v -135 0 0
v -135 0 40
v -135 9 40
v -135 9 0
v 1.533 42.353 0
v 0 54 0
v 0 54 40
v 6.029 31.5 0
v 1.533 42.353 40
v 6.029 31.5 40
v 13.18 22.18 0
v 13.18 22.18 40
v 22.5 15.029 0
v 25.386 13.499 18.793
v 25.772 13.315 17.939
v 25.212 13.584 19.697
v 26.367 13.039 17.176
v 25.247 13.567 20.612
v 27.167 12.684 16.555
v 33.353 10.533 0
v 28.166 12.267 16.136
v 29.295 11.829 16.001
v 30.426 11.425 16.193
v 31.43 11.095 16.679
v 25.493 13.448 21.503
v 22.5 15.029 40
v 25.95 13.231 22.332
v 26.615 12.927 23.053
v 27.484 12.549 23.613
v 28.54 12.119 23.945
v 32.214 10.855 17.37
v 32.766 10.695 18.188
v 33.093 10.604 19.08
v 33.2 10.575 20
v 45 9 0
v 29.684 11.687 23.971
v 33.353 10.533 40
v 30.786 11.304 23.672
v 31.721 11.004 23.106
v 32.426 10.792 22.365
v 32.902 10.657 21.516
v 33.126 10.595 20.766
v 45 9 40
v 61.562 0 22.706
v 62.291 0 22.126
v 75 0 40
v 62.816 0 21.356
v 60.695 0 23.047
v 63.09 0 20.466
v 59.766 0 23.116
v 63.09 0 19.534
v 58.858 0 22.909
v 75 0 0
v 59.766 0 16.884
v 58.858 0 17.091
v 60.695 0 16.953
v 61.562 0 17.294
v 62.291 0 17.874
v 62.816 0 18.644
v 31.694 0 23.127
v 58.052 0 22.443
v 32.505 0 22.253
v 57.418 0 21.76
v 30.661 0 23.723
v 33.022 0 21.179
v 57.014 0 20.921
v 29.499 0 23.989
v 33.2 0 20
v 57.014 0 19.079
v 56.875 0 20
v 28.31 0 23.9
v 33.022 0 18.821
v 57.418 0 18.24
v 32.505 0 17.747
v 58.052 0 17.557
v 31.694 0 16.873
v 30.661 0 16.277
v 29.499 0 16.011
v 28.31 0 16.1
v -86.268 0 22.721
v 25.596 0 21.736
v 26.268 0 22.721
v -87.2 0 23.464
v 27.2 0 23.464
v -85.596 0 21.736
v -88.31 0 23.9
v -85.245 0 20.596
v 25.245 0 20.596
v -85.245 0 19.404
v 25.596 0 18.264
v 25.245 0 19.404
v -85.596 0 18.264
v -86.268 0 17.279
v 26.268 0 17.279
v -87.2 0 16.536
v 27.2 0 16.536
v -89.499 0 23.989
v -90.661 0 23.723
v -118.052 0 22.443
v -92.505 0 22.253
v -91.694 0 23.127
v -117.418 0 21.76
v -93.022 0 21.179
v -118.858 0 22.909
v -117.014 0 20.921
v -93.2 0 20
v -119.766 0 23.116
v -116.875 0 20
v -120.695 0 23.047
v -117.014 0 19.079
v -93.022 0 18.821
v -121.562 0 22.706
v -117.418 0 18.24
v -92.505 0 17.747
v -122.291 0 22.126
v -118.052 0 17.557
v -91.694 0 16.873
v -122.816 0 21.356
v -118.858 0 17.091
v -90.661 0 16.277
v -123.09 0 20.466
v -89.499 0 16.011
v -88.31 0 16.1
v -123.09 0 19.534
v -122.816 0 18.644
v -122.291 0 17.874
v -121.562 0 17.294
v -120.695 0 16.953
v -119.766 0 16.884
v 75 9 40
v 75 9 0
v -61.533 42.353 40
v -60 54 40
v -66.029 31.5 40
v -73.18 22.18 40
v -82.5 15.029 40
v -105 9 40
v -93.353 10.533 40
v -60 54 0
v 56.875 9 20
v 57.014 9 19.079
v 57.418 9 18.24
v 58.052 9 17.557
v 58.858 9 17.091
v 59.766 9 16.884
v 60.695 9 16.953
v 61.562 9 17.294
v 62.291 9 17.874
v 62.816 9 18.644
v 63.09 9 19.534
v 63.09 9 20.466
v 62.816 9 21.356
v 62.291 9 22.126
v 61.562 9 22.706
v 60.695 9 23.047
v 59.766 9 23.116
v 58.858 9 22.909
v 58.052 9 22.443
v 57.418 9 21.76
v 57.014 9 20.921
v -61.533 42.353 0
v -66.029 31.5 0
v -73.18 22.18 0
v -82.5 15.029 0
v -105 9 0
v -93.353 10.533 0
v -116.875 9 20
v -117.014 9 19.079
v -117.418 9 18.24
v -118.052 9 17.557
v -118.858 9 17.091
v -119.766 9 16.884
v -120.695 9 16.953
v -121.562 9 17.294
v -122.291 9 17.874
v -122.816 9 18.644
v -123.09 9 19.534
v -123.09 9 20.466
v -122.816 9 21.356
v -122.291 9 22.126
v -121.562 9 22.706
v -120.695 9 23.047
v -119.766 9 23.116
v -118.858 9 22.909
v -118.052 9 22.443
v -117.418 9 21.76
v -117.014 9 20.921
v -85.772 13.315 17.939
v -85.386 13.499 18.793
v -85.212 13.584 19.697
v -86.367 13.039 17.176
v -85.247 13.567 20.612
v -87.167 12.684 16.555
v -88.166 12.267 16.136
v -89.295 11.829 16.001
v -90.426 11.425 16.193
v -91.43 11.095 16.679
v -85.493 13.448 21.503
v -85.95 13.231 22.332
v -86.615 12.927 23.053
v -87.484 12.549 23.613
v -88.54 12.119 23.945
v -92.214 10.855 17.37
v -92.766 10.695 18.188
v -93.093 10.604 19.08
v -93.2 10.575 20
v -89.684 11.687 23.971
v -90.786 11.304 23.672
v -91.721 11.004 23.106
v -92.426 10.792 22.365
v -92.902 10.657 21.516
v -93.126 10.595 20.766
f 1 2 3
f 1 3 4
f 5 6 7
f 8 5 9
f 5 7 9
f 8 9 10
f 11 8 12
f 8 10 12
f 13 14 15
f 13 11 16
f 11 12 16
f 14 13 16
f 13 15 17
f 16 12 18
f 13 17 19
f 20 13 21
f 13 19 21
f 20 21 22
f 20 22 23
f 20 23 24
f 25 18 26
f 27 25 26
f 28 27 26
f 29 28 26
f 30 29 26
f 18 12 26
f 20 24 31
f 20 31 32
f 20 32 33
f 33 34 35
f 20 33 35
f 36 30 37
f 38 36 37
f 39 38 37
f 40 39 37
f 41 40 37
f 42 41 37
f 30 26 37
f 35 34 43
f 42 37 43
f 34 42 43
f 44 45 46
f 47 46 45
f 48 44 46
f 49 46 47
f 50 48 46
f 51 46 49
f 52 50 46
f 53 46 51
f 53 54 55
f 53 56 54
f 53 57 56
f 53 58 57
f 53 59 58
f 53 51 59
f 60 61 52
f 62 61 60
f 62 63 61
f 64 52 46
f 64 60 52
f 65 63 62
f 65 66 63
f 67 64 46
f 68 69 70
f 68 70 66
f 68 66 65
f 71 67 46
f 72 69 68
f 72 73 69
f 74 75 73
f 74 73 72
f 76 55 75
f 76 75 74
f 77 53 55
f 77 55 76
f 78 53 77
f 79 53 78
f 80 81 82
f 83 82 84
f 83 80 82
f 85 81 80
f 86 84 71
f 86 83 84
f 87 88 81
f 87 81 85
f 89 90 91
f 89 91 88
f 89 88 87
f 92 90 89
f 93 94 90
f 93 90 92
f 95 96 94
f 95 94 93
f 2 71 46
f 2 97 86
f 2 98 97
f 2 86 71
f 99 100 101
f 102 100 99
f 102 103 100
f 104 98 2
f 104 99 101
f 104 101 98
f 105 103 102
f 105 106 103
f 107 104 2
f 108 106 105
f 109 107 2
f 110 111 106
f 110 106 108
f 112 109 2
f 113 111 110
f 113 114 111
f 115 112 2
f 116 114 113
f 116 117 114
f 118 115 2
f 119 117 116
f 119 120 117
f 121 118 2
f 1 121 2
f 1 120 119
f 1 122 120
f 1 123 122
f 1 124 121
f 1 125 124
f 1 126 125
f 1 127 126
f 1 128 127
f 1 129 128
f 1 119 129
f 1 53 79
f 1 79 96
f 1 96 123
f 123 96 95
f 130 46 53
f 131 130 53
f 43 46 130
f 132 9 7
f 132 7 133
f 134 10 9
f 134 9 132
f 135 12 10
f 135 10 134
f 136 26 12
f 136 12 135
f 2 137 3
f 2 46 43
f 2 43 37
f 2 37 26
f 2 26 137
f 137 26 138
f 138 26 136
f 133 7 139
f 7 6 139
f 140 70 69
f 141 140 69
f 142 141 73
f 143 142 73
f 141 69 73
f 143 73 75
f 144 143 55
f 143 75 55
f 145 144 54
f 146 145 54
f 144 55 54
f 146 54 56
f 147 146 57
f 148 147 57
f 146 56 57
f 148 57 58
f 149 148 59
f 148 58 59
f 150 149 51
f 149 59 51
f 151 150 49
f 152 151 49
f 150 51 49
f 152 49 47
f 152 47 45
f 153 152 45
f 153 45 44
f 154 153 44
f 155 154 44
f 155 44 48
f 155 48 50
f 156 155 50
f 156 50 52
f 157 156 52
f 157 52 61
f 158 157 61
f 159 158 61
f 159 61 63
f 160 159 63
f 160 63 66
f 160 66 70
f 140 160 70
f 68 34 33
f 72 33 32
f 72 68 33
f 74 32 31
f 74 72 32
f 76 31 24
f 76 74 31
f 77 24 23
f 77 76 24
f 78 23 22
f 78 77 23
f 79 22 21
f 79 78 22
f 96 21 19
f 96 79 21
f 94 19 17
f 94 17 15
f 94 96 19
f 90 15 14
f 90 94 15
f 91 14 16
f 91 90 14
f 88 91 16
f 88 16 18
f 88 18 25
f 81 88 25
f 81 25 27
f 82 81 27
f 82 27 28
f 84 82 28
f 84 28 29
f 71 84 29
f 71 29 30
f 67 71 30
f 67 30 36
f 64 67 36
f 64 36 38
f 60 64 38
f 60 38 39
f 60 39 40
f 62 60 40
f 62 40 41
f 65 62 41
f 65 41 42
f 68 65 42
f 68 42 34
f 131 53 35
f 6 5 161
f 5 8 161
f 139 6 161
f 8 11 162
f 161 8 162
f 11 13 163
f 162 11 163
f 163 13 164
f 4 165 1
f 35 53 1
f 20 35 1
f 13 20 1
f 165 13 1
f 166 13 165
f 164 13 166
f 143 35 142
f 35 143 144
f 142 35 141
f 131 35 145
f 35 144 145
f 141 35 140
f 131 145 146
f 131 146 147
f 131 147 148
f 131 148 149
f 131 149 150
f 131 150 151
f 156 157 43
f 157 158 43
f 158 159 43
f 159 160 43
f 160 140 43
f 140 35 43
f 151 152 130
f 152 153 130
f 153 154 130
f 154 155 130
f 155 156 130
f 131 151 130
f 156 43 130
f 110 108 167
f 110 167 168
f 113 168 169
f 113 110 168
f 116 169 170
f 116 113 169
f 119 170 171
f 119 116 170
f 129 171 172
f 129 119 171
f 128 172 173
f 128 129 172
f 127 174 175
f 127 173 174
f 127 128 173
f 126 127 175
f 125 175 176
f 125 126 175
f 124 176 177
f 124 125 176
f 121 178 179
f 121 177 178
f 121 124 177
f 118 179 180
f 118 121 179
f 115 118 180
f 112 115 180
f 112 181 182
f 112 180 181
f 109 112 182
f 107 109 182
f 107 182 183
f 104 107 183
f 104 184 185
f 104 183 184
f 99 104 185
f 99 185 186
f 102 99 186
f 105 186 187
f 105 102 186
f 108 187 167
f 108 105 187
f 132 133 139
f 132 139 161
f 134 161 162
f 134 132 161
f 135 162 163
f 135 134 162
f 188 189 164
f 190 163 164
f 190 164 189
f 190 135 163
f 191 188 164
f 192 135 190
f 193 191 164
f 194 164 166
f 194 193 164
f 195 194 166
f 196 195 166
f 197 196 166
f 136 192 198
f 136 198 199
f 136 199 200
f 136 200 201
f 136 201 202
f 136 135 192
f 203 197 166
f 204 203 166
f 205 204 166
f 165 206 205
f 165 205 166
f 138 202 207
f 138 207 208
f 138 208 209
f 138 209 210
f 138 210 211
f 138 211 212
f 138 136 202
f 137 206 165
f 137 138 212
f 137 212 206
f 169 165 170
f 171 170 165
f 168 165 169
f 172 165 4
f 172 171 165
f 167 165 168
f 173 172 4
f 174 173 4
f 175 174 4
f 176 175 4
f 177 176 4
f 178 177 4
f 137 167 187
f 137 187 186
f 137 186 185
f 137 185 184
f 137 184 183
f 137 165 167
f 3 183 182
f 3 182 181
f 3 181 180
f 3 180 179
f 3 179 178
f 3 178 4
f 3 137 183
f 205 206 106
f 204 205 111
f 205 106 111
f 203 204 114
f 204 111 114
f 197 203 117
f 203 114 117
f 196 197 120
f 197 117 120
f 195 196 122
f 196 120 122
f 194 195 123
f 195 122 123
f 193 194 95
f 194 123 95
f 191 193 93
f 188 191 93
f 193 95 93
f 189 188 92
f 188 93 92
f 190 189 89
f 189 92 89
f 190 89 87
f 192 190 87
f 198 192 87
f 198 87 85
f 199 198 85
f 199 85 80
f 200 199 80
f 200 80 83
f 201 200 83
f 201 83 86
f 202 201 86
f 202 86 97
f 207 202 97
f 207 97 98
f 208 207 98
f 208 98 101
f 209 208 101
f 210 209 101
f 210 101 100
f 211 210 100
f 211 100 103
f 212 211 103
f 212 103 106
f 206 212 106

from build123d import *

# Parameters (mm, degrees)
SKETCH1_W                    = 60
SKETCH1_H                    = 40
BOSS_EXTRUDE1_DEPTH          = 54
SKETCH3_W                    = 75
SKETCH3_H                    = 40
SKETCH3_R                    = 4
BOSS_EXTRUDE2_DEPTH          = 54
CUT_EXTRUDE2_DEPTH           = 60
TAP_DRILL_FOR_M6_HELICOIL1_D = 6.25


with BuildPart() as part:
    # Sketch1 → Boss-Extrude1 (new body)
    with BuildSketch(Plane(origin=(0, 0, 0), x_dir=(1, 0, 0), z_dir=(0, 1, 0))):
        with Locations((-30, -20)):
            Rectangle(SKETCH1_W, SKETCH1_H)
    extrude(amount=BOSS_EXTRUDE1_DEPTH)

    # Sketch3 → Boss-Extrude2 (add)
    with BuildSketch(Plane(origin=(0, 0, 0), x_dir=(1, 0, 0), z_dir=(0, 1, 0))):
        with Locations((37.5, -20)):
            Rectangle(SKETCH3_W, SKETCH3_H)
        with Locations((29.2, -20)):
            Circle(SKETCH3_R, mode=Mode.SUBTRACT)
    boss_extrude2 = extrude(amount=BOSS_EXTRUDE2_DEPTH)

    # Sketch4 → Cut-Extrude2 (cut)
    with BuildSketch(Plane.XY.offset(40)):
        with BuildLine():
            ThreePointArc((75, 20.458980338), (61.05699404, 11.962243847), (45, 9))
            Line((45, 9), (75, 9))
            Line((75, 9), (75, 20.458980338))
        make_face()
        with BuildLine():
            Line((45, 9), (45, 54))
            Line((45, 54), (0, 54))
            ThreePointArc((0, 54), (13.180194847, 22.180194847), (45, 9))
        make_face()
        with BuildLine():
            Line((75, 54), (45, 54))
            Line((45, 54), (45, 9))
            ThreePointArc((45, 9), (61.05699404, 11.962243847), (75, 20.458980338))
            Line((75, 20.458980338), (75, 54))
        make_face()
    cut_extrude2 = extrude(amount=-CUT_EXTRUDE2_DEPTH, mode=Mode.SUBTRACT)

    # Tap Drill for M6 Helicoil1 (through all)
    with Locations(Plane(origin=(0, 9, 0), x_dir=(1, 0, 0), z_dir=(0, 1, 0))):
        with Locations((60, -20)):
            tap_drill_for_m6_helicoil1 = Hole(TAP_DRILL_FOR_M6_HELICOIL1_D / 2)

    # Mirror1: Boss-Extrude2, Cut-Extrude2, Tap Drill for M6 Helicoil1 across plane
    add(boss_extrude2.mirror(Plane(origin=(-30, 0, 0), x_dir=(0, 0, 1), z_dir=(1, 0, 0))))
    add(cut_extrude2.mirror(Plane(origin=(-30, 0, 0), x_dir=(0, 0, 1), z_dir=(1, 0, 0))), mode=Mode.SUBTRACT)
    add(tap_drill_for_m6_helicoil1.mirror(Plane(origin=(-30, 0, 0), x_dir=(0, 0, 1), z_dir=(1, 0, 0))), mode=Mode.SUBTRACT)


solid = part.part
